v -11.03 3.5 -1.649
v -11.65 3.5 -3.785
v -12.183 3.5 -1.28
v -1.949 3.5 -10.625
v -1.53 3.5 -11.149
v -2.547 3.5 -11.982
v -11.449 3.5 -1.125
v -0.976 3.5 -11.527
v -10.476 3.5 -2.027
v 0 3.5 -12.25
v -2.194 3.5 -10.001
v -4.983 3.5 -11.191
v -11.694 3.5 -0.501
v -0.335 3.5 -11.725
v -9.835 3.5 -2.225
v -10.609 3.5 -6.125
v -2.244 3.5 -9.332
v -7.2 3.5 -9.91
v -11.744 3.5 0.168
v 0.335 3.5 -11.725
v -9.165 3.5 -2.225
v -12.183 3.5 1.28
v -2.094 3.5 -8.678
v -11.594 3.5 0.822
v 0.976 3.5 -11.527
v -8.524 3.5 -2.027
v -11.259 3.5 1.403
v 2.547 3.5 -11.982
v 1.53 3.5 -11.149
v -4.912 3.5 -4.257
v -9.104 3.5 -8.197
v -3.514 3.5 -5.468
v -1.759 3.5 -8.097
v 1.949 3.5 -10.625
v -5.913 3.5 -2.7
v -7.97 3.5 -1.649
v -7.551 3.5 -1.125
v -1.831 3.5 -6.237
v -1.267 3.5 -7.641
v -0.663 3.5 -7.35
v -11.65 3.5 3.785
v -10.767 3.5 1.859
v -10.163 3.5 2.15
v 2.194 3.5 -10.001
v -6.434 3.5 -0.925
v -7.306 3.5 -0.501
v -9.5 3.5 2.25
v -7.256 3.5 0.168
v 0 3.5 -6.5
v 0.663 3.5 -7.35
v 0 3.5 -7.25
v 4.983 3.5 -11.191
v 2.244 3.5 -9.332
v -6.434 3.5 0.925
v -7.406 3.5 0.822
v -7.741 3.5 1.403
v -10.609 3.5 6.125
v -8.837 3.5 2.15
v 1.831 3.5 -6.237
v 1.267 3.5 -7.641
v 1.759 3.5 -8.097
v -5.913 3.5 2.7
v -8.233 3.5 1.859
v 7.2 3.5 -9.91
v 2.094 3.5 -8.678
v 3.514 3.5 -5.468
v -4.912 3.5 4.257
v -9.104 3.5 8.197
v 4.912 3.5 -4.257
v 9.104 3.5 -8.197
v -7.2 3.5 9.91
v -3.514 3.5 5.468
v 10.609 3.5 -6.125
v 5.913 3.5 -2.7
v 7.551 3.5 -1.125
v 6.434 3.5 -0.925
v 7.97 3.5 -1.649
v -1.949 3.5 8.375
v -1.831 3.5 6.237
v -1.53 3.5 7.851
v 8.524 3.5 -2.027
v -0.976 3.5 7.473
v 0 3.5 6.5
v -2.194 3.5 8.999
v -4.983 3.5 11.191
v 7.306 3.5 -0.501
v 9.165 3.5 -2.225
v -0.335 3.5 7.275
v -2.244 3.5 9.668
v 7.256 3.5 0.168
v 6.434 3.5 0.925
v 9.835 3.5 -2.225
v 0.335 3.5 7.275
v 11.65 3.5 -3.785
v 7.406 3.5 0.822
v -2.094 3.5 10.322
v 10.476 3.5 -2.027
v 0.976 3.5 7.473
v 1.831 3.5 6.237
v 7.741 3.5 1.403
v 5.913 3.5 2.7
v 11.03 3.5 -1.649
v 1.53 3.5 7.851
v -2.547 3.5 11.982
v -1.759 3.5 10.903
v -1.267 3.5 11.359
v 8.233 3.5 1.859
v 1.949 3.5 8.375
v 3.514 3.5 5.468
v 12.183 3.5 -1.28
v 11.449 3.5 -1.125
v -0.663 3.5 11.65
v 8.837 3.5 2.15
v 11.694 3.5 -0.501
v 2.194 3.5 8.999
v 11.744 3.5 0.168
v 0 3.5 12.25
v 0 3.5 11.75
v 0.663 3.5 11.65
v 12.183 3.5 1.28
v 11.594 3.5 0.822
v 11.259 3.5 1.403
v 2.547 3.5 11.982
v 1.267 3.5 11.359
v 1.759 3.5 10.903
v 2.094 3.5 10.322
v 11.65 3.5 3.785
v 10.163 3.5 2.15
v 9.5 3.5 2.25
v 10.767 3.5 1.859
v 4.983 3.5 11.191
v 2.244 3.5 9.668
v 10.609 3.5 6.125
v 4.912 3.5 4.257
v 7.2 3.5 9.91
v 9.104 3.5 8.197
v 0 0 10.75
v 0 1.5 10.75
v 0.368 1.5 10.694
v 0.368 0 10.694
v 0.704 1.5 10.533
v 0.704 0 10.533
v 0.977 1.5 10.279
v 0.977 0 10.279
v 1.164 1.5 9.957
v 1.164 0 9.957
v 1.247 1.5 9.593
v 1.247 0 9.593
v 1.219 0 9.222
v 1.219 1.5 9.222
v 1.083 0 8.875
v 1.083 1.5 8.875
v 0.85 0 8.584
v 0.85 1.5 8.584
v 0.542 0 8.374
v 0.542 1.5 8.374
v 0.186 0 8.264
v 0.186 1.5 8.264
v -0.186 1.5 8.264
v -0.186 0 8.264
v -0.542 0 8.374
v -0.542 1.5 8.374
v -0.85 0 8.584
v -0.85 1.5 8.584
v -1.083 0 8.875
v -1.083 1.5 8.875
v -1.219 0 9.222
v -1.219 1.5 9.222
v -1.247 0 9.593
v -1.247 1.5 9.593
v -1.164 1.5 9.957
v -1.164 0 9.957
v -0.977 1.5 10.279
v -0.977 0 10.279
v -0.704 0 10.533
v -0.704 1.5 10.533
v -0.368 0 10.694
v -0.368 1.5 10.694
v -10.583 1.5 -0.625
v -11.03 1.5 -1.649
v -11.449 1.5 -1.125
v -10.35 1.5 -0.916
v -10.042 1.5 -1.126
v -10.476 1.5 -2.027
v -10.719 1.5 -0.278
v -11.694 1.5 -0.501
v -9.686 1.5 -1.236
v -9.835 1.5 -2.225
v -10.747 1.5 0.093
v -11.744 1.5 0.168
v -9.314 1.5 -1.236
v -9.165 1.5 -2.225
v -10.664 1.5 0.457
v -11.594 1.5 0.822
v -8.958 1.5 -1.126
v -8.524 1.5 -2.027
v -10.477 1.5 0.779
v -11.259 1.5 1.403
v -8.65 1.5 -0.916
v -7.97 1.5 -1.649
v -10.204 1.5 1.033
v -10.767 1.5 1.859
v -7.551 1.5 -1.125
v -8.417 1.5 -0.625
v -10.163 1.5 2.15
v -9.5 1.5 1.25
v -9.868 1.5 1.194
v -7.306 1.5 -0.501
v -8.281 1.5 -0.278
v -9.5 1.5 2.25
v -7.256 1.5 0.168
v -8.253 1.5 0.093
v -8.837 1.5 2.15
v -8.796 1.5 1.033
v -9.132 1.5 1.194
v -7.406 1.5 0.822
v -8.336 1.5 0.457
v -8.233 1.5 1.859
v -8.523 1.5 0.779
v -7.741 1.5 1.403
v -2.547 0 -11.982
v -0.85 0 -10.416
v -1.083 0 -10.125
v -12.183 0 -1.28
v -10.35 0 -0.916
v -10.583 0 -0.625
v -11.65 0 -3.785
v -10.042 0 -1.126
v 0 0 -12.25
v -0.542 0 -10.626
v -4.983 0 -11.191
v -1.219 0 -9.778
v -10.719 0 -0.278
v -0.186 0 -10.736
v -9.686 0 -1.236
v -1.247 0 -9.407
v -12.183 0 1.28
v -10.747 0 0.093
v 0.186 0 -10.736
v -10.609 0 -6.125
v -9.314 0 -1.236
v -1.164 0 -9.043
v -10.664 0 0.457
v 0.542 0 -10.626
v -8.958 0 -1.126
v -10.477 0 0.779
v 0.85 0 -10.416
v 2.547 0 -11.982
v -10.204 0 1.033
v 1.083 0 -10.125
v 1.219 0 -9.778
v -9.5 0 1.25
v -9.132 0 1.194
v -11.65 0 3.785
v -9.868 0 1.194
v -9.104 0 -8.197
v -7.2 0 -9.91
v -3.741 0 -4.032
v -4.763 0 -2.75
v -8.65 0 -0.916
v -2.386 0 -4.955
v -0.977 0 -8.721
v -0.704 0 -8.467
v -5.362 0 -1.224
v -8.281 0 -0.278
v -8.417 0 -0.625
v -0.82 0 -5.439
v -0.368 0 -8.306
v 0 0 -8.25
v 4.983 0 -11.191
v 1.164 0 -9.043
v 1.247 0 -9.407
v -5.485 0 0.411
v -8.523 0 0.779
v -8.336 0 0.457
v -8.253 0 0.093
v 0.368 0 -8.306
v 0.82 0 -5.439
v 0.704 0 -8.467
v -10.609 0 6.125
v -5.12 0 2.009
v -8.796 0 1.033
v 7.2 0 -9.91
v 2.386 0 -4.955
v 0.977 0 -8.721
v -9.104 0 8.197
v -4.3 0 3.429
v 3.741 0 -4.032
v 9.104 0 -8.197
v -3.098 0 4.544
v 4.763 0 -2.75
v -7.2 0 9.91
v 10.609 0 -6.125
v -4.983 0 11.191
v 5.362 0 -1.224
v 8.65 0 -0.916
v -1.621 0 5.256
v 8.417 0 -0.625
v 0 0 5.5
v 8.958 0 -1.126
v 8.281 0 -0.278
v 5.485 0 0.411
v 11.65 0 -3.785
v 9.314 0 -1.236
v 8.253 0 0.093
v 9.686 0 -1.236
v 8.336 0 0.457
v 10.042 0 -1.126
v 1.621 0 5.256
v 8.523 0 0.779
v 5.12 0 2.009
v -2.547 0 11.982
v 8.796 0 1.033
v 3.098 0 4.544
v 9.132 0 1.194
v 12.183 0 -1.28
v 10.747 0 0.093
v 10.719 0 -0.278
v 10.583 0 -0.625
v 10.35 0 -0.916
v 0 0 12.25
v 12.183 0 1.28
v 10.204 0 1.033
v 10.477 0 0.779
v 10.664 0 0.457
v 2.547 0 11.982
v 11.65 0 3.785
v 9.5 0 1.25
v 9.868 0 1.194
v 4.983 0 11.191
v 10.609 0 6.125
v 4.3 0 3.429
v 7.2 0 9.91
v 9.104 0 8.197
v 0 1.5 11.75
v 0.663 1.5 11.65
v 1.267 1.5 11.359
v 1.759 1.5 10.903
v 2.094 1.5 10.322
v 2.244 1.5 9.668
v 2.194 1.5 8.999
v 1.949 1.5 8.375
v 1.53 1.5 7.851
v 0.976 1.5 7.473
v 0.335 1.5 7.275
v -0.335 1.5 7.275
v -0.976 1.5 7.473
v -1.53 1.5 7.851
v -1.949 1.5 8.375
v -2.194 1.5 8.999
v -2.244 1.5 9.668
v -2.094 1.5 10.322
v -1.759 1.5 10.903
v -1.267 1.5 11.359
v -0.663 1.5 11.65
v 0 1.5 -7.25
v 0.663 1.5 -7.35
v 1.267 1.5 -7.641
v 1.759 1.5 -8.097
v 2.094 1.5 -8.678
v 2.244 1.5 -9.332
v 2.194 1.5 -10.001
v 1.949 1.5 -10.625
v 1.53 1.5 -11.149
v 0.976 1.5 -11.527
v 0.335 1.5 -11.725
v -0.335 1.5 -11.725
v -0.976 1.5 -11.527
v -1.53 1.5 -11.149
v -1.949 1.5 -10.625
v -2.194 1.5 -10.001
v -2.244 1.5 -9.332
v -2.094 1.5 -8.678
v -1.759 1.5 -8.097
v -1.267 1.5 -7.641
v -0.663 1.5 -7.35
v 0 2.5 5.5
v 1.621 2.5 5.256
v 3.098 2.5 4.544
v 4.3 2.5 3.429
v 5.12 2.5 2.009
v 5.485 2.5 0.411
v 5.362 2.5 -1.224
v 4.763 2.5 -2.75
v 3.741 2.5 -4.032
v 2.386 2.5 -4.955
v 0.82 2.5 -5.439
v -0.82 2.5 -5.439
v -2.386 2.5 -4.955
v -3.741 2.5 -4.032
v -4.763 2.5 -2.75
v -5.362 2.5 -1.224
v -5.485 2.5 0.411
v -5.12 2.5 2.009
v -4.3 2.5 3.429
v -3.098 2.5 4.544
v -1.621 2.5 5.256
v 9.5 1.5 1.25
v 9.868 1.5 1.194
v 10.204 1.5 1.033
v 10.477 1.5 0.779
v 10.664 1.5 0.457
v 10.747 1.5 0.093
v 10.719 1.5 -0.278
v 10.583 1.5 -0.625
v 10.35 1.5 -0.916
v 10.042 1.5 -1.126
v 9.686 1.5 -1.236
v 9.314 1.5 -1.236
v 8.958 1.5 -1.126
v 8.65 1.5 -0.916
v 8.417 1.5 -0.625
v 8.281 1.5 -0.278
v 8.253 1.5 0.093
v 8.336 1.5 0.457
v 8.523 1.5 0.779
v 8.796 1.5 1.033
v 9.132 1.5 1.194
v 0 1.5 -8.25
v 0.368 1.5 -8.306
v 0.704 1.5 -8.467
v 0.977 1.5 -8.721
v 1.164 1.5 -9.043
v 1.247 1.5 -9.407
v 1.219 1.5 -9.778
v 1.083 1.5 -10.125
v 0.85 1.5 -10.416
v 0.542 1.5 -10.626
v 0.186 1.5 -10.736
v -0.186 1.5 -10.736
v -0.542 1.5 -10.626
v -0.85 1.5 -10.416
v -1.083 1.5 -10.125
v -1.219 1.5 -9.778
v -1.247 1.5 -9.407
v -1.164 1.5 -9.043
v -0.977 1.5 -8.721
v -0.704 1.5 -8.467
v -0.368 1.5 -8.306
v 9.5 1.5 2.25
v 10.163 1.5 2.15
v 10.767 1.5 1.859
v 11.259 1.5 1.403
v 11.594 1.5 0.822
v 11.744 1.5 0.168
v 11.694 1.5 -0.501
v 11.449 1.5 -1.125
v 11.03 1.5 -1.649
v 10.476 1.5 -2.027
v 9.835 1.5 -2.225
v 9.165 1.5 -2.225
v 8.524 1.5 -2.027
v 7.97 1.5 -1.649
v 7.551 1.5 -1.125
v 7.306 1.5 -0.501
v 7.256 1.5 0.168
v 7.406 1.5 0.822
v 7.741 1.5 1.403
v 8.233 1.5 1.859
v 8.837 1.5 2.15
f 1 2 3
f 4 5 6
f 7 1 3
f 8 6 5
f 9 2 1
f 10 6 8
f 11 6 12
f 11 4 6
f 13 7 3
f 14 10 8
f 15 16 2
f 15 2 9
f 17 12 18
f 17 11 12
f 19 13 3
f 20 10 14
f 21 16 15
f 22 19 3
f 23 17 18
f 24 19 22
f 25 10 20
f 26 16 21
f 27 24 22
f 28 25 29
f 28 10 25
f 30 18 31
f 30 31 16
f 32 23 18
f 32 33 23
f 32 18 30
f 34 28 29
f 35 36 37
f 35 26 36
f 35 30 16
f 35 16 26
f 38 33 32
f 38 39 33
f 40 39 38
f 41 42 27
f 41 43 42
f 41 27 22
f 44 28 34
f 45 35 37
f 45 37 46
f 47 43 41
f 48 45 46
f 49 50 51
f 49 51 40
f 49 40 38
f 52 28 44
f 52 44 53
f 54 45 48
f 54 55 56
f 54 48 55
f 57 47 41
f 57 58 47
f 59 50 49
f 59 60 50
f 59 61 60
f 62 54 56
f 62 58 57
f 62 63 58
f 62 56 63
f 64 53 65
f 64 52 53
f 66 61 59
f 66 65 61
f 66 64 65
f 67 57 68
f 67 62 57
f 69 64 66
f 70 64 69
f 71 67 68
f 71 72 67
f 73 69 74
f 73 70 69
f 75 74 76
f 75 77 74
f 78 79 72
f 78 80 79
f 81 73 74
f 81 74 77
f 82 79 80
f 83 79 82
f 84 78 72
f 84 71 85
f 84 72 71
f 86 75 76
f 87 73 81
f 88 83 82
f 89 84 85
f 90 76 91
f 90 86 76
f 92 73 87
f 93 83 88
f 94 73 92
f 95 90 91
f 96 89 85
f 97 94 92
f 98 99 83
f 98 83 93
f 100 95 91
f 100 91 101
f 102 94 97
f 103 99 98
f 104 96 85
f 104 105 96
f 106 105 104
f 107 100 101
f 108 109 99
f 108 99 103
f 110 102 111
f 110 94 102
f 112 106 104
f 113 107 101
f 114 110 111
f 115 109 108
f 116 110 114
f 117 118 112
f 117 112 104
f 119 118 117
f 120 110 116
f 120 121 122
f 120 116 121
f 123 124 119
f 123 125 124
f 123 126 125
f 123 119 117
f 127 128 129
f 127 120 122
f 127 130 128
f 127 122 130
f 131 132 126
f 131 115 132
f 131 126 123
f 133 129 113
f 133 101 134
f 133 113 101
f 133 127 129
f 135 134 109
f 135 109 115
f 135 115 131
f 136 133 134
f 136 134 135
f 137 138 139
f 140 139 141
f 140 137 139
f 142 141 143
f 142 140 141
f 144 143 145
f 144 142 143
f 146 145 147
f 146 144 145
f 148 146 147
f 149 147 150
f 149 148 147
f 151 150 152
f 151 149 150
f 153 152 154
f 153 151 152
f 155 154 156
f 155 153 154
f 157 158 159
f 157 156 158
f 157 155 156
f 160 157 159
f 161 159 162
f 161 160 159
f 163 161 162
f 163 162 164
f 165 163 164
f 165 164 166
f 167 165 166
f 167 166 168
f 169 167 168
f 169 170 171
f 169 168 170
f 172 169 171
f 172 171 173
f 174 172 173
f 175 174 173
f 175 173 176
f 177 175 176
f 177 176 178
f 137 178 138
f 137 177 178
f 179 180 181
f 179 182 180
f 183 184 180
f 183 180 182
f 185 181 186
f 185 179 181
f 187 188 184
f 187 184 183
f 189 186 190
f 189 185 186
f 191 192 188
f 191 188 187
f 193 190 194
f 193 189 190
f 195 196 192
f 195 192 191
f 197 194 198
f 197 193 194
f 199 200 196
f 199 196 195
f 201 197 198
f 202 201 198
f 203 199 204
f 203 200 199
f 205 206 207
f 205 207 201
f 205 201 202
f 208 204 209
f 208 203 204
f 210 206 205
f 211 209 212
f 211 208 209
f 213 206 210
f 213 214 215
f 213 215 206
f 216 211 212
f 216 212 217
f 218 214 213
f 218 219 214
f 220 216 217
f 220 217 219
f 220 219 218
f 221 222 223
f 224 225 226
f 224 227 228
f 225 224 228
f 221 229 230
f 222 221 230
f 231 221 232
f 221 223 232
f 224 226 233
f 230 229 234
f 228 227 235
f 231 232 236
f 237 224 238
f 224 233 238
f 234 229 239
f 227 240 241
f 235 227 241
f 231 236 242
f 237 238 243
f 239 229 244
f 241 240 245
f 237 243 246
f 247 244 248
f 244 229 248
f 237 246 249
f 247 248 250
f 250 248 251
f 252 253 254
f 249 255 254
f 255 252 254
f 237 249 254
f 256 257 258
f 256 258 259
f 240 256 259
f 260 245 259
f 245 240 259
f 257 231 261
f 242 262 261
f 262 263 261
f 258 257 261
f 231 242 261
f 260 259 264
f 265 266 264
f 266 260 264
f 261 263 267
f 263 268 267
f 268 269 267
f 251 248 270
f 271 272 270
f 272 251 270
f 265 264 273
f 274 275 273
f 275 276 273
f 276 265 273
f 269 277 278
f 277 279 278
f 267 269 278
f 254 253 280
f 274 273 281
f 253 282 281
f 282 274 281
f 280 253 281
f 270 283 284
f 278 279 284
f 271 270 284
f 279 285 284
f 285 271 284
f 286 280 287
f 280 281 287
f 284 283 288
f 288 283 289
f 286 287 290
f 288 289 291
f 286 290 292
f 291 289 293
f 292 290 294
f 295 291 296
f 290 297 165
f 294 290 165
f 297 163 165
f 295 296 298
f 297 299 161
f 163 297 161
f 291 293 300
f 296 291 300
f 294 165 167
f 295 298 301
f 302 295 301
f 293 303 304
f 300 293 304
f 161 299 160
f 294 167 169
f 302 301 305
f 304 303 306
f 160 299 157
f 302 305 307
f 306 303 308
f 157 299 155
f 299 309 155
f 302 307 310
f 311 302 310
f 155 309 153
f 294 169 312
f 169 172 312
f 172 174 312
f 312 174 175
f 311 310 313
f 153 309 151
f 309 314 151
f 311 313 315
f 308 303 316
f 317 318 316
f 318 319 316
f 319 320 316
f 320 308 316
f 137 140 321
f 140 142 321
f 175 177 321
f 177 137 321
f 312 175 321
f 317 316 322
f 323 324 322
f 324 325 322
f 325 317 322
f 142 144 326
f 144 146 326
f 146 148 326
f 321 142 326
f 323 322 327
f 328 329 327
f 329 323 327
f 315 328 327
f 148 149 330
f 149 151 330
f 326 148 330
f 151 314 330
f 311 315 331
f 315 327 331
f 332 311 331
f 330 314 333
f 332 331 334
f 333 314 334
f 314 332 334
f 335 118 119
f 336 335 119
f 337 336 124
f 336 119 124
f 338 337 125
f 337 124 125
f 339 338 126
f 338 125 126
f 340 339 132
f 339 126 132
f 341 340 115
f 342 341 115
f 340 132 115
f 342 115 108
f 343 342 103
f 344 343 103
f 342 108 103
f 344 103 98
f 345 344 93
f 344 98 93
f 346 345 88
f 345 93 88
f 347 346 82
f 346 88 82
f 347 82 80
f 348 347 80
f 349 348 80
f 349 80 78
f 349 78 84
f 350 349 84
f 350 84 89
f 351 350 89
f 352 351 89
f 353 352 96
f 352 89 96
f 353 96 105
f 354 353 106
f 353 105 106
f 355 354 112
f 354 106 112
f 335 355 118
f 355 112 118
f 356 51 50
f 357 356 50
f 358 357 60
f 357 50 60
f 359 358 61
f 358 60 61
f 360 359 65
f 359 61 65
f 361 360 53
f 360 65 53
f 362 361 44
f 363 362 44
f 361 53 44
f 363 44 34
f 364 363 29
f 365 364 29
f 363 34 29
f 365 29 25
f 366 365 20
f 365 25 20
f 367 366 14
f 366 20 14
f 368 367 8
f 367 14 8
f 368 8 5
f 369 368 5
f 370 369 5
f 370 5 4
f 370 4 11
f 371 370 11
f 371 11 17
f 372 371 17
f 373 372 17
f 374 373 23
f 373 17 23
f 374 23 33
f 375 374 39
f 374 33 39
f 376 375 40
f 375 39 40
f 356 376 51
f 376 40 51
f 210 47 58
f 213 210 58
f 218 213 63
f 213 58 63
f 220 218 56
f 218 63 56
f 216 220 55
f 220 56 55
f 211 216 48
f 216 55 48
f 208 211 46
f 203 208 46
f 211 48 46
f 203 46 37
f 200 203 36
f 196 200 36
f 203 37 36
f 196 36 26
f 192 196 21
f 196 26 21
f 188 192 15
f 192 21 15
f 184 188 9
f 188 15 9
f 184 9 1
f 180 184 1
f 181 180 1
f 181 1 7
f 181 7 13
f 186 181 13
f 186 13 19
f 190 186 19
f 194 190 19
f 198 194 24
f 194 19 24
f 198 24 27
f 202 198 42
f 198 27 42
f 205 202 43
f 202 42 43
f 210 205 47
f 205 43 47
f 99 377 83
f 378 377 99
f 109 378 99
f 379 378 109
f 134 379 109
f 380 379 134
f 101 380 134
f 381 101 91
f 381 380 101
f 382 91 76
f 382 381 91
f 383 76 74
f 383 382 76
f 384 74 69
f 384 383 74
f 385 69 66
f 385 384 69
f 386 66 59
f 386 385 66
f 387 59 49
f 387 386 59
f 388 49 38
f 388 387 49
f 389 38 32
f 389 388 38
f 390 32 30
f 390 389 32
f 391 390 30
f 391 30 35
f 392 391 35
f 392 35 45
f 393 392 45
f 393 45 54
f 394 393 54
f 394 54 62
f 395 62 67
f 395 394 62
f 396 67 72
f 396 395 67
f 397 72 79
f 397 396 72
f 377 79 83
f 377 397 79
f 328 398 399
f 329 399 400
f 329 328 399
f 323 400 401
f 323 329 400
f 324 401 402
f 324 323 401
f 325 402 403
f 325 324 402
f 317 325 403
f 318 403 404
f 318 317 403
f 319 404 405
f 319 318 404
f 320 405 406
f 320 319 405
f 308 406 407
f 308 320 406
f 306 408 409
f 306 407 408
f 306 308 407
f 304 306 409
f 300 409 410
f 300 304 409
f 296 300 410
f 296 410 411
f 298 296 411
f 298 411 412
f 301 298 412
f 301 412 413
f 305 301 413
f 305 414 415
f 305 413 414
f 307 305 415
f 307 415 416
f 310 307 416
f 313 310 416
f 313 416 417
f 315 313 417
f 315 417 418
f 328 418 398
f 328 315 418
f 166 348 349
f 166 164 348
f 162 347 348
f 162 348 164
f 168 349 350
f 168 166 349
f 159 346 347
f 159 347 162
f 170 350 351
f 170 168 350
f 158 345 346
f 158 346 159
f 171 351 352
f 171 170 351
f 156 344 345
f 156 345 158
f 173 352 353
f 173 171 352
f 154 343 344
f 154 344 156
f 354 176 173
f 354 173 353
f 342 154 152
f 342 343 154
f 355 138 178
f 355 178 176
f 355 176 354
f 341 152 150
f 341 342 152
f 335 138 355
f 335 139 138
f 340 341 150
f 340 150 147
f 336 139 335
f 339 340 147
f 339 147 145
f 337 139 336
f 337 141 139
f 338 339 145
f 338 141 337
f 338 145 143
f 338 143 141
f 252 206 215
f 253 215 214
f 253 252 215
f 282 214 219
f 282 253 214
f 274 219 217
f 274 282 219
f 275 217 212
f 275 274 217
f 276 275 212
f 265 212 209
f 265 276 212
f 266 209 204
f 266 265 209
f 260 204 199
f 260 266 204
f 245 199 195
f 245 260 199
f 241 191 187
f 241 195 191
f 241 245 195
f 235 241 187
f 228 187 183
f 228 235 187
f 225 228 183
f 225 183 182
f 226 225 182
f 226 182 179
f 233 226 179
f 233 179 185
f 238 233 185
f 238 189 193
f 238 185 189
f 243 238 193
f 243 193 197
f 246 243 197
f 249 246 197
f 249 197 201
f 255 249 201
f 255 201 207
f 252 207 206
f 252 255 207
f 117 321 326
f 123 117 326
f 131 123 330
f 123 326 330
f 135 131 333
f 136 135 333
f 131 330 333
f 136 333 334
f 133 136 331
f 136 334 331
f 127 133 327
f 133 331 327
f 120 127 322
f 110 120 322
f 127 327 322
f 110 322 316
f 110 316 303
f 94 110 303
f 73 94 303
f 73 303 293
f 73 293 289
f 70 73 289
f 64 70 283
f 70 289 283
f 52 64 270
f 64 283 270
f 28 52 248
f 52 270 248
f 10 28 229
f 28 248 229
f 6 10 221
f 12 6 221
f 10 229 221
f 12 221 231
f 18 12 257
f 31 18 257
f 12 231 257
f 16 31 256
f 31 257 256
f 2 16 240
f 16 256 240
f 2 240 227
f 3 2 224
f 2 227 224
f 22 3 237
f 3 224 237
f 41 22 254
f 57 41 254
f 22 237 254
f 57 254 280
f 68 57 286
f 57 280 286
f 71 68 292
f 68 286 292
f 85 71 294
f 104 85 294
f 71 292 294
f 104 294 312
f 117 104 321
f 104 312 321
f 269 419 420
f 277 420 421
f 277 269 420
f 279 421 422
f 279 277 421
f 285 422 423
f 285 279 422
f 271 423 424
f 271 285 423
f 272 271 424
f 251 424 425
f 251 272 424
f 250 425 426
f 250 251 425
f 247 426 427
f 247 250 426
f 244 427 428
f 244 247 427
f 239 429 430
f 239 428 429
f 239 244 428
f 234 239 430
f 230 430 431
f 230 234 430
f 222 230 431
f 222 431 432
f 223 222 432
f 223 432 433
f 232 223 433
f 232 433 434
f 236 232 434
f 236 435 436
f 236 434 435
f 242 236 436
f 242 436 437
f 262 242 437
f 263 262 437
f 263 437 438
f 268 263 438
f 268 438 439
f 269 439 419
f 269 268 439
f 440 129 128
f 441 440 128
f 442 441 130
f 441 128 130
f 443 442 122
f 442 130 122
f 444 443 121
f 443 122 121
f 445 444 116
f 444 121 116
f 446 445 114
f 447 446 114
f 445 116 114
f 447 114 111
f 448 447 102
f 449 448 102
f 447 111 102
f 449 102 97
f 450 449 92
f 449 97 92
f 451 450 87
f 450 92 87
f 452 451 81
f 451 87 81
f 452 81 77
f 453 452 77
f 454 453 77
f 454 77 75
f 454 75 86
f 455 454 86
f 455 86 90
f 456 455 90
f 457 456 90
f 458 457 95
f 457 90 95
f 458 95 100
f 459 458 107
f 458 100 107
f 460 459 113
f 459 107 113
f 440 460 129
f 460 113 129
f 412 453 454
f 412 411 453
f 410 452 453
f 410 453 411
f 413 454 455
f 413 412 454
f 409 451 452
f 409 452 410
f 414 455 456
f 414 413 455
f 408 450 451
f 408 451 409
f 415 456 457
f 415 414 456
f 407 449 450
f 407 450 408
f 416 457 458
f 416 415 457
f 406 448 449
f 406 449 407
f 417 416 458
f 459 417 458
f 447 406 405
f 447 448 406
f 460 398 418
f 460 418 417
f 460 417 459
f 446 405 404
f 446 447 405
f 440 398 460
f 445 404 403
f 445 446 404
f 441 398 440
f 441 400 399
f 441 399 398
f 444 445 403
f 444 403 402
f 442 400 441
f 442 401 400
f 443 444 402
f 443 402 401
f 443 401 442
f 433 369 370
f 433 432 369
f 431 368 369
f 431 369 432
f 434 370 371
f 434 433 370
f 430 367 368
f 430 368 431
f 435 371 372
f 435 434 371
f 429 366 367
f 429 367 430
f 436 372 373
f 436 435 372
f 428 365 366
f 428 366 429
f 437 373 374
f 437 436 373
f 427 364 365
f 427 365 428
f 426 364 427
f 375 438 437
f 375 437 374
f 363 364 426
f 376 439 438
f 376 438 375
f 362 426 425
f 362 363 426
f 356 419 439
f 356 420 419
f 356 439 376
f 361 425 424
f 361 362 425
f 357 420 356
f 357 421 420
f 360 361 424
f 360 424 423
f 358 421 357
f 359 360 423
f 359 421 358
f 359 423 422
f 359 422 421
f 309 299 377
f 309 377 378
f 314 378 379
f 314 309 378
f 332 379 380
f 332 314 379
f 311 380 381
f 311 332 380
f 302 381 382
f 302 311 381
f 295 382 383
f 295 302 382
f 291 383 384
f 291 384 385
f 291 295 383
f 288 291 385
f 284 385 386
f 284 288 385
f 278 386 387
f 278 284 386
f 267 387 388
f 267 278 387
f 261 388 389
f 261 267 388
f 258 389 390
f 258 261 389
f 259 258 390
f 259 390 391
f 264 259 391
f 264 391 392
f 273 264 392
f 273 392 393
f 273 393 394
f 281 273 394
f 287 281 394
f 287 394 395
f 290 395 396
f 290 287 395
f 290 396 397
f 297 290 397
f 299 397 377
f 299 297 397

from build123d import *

# Parameters (mm, degrees)
SKETCH_1_R          = 12.25
SKETCH_1_R_2        = 5.5
SKETCH_1_R_3        = 1.25
EXTRUDE_1_DEPTH     = 3.5
SKETCH_2_R          = 2.25
CUT_EXTRUDE_1_DEPTH = 2
CHAMFER_1_SIZE      = 1


with BuildPart() as part:
    # Эскиз1 → Бобышка-Вытянуть1 (new body)
    with BuildSketch(Plane(origin=(0, 0, 0), x_dir=(1, 0, 0), z_dir=(0, 1, 0))):
        with Locations(Location((0, 0, 0), (0, 0, 270))):
            Circle(SKETCH_1_R)
        with Locations(Location((0, 0, 0), (0, 0, 270))):
            Circle(SKETCH_1_R_2, mode=Mode.SUBTRACT)
        with Locations(Location((0, 9.5, 0), (0, 0, 270))):
            Circle(SKETCH_1_R_3, mode=Mode.SUBTRACT)
        with Locations(Location((9.5, 0, 0), (0, 0, 270))):
            Circle(SKETCH_1_R_3, mode=Mode.SUBTRACT)
        with Locations(Location((0, -9.5, 0), (0, 0, 270))):
            Circle(SKETCH_1_R_3, mode=Mode.SUBTRACT)
        with Locations(Location((-9.5, 0, 0), (0, 0, 270))):
            Circle(SKETCH_1_R_3, mode=Mode.SUBTRACT)
    extrude(amount=EXTRUDE_1_DEPTH)

    # Эскиз2 → Вырез-Вытянуть1 (cut)
    with BuildSketch(Plane(origin=(0, 3.5, 0), x_dir=(1, 0, 0), z_dir=(0, 1, 0))):
        with Locations(Location((0, 9.5, 0), (0, 0, 270))):
            Circle(SKETCH_2_R)
        with Locations(Location((9.5, 0, 0), (0, 0, 270))):
            Circle(SKETCH_2_R)
        with Locations(Location((0, -9.5, 0), (0, 0, 270))):
            Circle(SKETCH_2_R)
        with Locations(Location((-9.5, 0, 0), (0, 0, 270))):
            Circle(SKETCH_2_R)
    extrude(amount=-CUT_EXTRUDE_1_DEPTH, mode=Mode.SUBTRACT)

    # Фаска1
    chamfer_1_edges = [part.edges().sort_by_distance(p)[0] for p in [
        (0, 3.5, -5.5),
    ]]
    chamfer(chamfer_1_edges, length=CHAMFER_1_SIZE)


solid = part.part
